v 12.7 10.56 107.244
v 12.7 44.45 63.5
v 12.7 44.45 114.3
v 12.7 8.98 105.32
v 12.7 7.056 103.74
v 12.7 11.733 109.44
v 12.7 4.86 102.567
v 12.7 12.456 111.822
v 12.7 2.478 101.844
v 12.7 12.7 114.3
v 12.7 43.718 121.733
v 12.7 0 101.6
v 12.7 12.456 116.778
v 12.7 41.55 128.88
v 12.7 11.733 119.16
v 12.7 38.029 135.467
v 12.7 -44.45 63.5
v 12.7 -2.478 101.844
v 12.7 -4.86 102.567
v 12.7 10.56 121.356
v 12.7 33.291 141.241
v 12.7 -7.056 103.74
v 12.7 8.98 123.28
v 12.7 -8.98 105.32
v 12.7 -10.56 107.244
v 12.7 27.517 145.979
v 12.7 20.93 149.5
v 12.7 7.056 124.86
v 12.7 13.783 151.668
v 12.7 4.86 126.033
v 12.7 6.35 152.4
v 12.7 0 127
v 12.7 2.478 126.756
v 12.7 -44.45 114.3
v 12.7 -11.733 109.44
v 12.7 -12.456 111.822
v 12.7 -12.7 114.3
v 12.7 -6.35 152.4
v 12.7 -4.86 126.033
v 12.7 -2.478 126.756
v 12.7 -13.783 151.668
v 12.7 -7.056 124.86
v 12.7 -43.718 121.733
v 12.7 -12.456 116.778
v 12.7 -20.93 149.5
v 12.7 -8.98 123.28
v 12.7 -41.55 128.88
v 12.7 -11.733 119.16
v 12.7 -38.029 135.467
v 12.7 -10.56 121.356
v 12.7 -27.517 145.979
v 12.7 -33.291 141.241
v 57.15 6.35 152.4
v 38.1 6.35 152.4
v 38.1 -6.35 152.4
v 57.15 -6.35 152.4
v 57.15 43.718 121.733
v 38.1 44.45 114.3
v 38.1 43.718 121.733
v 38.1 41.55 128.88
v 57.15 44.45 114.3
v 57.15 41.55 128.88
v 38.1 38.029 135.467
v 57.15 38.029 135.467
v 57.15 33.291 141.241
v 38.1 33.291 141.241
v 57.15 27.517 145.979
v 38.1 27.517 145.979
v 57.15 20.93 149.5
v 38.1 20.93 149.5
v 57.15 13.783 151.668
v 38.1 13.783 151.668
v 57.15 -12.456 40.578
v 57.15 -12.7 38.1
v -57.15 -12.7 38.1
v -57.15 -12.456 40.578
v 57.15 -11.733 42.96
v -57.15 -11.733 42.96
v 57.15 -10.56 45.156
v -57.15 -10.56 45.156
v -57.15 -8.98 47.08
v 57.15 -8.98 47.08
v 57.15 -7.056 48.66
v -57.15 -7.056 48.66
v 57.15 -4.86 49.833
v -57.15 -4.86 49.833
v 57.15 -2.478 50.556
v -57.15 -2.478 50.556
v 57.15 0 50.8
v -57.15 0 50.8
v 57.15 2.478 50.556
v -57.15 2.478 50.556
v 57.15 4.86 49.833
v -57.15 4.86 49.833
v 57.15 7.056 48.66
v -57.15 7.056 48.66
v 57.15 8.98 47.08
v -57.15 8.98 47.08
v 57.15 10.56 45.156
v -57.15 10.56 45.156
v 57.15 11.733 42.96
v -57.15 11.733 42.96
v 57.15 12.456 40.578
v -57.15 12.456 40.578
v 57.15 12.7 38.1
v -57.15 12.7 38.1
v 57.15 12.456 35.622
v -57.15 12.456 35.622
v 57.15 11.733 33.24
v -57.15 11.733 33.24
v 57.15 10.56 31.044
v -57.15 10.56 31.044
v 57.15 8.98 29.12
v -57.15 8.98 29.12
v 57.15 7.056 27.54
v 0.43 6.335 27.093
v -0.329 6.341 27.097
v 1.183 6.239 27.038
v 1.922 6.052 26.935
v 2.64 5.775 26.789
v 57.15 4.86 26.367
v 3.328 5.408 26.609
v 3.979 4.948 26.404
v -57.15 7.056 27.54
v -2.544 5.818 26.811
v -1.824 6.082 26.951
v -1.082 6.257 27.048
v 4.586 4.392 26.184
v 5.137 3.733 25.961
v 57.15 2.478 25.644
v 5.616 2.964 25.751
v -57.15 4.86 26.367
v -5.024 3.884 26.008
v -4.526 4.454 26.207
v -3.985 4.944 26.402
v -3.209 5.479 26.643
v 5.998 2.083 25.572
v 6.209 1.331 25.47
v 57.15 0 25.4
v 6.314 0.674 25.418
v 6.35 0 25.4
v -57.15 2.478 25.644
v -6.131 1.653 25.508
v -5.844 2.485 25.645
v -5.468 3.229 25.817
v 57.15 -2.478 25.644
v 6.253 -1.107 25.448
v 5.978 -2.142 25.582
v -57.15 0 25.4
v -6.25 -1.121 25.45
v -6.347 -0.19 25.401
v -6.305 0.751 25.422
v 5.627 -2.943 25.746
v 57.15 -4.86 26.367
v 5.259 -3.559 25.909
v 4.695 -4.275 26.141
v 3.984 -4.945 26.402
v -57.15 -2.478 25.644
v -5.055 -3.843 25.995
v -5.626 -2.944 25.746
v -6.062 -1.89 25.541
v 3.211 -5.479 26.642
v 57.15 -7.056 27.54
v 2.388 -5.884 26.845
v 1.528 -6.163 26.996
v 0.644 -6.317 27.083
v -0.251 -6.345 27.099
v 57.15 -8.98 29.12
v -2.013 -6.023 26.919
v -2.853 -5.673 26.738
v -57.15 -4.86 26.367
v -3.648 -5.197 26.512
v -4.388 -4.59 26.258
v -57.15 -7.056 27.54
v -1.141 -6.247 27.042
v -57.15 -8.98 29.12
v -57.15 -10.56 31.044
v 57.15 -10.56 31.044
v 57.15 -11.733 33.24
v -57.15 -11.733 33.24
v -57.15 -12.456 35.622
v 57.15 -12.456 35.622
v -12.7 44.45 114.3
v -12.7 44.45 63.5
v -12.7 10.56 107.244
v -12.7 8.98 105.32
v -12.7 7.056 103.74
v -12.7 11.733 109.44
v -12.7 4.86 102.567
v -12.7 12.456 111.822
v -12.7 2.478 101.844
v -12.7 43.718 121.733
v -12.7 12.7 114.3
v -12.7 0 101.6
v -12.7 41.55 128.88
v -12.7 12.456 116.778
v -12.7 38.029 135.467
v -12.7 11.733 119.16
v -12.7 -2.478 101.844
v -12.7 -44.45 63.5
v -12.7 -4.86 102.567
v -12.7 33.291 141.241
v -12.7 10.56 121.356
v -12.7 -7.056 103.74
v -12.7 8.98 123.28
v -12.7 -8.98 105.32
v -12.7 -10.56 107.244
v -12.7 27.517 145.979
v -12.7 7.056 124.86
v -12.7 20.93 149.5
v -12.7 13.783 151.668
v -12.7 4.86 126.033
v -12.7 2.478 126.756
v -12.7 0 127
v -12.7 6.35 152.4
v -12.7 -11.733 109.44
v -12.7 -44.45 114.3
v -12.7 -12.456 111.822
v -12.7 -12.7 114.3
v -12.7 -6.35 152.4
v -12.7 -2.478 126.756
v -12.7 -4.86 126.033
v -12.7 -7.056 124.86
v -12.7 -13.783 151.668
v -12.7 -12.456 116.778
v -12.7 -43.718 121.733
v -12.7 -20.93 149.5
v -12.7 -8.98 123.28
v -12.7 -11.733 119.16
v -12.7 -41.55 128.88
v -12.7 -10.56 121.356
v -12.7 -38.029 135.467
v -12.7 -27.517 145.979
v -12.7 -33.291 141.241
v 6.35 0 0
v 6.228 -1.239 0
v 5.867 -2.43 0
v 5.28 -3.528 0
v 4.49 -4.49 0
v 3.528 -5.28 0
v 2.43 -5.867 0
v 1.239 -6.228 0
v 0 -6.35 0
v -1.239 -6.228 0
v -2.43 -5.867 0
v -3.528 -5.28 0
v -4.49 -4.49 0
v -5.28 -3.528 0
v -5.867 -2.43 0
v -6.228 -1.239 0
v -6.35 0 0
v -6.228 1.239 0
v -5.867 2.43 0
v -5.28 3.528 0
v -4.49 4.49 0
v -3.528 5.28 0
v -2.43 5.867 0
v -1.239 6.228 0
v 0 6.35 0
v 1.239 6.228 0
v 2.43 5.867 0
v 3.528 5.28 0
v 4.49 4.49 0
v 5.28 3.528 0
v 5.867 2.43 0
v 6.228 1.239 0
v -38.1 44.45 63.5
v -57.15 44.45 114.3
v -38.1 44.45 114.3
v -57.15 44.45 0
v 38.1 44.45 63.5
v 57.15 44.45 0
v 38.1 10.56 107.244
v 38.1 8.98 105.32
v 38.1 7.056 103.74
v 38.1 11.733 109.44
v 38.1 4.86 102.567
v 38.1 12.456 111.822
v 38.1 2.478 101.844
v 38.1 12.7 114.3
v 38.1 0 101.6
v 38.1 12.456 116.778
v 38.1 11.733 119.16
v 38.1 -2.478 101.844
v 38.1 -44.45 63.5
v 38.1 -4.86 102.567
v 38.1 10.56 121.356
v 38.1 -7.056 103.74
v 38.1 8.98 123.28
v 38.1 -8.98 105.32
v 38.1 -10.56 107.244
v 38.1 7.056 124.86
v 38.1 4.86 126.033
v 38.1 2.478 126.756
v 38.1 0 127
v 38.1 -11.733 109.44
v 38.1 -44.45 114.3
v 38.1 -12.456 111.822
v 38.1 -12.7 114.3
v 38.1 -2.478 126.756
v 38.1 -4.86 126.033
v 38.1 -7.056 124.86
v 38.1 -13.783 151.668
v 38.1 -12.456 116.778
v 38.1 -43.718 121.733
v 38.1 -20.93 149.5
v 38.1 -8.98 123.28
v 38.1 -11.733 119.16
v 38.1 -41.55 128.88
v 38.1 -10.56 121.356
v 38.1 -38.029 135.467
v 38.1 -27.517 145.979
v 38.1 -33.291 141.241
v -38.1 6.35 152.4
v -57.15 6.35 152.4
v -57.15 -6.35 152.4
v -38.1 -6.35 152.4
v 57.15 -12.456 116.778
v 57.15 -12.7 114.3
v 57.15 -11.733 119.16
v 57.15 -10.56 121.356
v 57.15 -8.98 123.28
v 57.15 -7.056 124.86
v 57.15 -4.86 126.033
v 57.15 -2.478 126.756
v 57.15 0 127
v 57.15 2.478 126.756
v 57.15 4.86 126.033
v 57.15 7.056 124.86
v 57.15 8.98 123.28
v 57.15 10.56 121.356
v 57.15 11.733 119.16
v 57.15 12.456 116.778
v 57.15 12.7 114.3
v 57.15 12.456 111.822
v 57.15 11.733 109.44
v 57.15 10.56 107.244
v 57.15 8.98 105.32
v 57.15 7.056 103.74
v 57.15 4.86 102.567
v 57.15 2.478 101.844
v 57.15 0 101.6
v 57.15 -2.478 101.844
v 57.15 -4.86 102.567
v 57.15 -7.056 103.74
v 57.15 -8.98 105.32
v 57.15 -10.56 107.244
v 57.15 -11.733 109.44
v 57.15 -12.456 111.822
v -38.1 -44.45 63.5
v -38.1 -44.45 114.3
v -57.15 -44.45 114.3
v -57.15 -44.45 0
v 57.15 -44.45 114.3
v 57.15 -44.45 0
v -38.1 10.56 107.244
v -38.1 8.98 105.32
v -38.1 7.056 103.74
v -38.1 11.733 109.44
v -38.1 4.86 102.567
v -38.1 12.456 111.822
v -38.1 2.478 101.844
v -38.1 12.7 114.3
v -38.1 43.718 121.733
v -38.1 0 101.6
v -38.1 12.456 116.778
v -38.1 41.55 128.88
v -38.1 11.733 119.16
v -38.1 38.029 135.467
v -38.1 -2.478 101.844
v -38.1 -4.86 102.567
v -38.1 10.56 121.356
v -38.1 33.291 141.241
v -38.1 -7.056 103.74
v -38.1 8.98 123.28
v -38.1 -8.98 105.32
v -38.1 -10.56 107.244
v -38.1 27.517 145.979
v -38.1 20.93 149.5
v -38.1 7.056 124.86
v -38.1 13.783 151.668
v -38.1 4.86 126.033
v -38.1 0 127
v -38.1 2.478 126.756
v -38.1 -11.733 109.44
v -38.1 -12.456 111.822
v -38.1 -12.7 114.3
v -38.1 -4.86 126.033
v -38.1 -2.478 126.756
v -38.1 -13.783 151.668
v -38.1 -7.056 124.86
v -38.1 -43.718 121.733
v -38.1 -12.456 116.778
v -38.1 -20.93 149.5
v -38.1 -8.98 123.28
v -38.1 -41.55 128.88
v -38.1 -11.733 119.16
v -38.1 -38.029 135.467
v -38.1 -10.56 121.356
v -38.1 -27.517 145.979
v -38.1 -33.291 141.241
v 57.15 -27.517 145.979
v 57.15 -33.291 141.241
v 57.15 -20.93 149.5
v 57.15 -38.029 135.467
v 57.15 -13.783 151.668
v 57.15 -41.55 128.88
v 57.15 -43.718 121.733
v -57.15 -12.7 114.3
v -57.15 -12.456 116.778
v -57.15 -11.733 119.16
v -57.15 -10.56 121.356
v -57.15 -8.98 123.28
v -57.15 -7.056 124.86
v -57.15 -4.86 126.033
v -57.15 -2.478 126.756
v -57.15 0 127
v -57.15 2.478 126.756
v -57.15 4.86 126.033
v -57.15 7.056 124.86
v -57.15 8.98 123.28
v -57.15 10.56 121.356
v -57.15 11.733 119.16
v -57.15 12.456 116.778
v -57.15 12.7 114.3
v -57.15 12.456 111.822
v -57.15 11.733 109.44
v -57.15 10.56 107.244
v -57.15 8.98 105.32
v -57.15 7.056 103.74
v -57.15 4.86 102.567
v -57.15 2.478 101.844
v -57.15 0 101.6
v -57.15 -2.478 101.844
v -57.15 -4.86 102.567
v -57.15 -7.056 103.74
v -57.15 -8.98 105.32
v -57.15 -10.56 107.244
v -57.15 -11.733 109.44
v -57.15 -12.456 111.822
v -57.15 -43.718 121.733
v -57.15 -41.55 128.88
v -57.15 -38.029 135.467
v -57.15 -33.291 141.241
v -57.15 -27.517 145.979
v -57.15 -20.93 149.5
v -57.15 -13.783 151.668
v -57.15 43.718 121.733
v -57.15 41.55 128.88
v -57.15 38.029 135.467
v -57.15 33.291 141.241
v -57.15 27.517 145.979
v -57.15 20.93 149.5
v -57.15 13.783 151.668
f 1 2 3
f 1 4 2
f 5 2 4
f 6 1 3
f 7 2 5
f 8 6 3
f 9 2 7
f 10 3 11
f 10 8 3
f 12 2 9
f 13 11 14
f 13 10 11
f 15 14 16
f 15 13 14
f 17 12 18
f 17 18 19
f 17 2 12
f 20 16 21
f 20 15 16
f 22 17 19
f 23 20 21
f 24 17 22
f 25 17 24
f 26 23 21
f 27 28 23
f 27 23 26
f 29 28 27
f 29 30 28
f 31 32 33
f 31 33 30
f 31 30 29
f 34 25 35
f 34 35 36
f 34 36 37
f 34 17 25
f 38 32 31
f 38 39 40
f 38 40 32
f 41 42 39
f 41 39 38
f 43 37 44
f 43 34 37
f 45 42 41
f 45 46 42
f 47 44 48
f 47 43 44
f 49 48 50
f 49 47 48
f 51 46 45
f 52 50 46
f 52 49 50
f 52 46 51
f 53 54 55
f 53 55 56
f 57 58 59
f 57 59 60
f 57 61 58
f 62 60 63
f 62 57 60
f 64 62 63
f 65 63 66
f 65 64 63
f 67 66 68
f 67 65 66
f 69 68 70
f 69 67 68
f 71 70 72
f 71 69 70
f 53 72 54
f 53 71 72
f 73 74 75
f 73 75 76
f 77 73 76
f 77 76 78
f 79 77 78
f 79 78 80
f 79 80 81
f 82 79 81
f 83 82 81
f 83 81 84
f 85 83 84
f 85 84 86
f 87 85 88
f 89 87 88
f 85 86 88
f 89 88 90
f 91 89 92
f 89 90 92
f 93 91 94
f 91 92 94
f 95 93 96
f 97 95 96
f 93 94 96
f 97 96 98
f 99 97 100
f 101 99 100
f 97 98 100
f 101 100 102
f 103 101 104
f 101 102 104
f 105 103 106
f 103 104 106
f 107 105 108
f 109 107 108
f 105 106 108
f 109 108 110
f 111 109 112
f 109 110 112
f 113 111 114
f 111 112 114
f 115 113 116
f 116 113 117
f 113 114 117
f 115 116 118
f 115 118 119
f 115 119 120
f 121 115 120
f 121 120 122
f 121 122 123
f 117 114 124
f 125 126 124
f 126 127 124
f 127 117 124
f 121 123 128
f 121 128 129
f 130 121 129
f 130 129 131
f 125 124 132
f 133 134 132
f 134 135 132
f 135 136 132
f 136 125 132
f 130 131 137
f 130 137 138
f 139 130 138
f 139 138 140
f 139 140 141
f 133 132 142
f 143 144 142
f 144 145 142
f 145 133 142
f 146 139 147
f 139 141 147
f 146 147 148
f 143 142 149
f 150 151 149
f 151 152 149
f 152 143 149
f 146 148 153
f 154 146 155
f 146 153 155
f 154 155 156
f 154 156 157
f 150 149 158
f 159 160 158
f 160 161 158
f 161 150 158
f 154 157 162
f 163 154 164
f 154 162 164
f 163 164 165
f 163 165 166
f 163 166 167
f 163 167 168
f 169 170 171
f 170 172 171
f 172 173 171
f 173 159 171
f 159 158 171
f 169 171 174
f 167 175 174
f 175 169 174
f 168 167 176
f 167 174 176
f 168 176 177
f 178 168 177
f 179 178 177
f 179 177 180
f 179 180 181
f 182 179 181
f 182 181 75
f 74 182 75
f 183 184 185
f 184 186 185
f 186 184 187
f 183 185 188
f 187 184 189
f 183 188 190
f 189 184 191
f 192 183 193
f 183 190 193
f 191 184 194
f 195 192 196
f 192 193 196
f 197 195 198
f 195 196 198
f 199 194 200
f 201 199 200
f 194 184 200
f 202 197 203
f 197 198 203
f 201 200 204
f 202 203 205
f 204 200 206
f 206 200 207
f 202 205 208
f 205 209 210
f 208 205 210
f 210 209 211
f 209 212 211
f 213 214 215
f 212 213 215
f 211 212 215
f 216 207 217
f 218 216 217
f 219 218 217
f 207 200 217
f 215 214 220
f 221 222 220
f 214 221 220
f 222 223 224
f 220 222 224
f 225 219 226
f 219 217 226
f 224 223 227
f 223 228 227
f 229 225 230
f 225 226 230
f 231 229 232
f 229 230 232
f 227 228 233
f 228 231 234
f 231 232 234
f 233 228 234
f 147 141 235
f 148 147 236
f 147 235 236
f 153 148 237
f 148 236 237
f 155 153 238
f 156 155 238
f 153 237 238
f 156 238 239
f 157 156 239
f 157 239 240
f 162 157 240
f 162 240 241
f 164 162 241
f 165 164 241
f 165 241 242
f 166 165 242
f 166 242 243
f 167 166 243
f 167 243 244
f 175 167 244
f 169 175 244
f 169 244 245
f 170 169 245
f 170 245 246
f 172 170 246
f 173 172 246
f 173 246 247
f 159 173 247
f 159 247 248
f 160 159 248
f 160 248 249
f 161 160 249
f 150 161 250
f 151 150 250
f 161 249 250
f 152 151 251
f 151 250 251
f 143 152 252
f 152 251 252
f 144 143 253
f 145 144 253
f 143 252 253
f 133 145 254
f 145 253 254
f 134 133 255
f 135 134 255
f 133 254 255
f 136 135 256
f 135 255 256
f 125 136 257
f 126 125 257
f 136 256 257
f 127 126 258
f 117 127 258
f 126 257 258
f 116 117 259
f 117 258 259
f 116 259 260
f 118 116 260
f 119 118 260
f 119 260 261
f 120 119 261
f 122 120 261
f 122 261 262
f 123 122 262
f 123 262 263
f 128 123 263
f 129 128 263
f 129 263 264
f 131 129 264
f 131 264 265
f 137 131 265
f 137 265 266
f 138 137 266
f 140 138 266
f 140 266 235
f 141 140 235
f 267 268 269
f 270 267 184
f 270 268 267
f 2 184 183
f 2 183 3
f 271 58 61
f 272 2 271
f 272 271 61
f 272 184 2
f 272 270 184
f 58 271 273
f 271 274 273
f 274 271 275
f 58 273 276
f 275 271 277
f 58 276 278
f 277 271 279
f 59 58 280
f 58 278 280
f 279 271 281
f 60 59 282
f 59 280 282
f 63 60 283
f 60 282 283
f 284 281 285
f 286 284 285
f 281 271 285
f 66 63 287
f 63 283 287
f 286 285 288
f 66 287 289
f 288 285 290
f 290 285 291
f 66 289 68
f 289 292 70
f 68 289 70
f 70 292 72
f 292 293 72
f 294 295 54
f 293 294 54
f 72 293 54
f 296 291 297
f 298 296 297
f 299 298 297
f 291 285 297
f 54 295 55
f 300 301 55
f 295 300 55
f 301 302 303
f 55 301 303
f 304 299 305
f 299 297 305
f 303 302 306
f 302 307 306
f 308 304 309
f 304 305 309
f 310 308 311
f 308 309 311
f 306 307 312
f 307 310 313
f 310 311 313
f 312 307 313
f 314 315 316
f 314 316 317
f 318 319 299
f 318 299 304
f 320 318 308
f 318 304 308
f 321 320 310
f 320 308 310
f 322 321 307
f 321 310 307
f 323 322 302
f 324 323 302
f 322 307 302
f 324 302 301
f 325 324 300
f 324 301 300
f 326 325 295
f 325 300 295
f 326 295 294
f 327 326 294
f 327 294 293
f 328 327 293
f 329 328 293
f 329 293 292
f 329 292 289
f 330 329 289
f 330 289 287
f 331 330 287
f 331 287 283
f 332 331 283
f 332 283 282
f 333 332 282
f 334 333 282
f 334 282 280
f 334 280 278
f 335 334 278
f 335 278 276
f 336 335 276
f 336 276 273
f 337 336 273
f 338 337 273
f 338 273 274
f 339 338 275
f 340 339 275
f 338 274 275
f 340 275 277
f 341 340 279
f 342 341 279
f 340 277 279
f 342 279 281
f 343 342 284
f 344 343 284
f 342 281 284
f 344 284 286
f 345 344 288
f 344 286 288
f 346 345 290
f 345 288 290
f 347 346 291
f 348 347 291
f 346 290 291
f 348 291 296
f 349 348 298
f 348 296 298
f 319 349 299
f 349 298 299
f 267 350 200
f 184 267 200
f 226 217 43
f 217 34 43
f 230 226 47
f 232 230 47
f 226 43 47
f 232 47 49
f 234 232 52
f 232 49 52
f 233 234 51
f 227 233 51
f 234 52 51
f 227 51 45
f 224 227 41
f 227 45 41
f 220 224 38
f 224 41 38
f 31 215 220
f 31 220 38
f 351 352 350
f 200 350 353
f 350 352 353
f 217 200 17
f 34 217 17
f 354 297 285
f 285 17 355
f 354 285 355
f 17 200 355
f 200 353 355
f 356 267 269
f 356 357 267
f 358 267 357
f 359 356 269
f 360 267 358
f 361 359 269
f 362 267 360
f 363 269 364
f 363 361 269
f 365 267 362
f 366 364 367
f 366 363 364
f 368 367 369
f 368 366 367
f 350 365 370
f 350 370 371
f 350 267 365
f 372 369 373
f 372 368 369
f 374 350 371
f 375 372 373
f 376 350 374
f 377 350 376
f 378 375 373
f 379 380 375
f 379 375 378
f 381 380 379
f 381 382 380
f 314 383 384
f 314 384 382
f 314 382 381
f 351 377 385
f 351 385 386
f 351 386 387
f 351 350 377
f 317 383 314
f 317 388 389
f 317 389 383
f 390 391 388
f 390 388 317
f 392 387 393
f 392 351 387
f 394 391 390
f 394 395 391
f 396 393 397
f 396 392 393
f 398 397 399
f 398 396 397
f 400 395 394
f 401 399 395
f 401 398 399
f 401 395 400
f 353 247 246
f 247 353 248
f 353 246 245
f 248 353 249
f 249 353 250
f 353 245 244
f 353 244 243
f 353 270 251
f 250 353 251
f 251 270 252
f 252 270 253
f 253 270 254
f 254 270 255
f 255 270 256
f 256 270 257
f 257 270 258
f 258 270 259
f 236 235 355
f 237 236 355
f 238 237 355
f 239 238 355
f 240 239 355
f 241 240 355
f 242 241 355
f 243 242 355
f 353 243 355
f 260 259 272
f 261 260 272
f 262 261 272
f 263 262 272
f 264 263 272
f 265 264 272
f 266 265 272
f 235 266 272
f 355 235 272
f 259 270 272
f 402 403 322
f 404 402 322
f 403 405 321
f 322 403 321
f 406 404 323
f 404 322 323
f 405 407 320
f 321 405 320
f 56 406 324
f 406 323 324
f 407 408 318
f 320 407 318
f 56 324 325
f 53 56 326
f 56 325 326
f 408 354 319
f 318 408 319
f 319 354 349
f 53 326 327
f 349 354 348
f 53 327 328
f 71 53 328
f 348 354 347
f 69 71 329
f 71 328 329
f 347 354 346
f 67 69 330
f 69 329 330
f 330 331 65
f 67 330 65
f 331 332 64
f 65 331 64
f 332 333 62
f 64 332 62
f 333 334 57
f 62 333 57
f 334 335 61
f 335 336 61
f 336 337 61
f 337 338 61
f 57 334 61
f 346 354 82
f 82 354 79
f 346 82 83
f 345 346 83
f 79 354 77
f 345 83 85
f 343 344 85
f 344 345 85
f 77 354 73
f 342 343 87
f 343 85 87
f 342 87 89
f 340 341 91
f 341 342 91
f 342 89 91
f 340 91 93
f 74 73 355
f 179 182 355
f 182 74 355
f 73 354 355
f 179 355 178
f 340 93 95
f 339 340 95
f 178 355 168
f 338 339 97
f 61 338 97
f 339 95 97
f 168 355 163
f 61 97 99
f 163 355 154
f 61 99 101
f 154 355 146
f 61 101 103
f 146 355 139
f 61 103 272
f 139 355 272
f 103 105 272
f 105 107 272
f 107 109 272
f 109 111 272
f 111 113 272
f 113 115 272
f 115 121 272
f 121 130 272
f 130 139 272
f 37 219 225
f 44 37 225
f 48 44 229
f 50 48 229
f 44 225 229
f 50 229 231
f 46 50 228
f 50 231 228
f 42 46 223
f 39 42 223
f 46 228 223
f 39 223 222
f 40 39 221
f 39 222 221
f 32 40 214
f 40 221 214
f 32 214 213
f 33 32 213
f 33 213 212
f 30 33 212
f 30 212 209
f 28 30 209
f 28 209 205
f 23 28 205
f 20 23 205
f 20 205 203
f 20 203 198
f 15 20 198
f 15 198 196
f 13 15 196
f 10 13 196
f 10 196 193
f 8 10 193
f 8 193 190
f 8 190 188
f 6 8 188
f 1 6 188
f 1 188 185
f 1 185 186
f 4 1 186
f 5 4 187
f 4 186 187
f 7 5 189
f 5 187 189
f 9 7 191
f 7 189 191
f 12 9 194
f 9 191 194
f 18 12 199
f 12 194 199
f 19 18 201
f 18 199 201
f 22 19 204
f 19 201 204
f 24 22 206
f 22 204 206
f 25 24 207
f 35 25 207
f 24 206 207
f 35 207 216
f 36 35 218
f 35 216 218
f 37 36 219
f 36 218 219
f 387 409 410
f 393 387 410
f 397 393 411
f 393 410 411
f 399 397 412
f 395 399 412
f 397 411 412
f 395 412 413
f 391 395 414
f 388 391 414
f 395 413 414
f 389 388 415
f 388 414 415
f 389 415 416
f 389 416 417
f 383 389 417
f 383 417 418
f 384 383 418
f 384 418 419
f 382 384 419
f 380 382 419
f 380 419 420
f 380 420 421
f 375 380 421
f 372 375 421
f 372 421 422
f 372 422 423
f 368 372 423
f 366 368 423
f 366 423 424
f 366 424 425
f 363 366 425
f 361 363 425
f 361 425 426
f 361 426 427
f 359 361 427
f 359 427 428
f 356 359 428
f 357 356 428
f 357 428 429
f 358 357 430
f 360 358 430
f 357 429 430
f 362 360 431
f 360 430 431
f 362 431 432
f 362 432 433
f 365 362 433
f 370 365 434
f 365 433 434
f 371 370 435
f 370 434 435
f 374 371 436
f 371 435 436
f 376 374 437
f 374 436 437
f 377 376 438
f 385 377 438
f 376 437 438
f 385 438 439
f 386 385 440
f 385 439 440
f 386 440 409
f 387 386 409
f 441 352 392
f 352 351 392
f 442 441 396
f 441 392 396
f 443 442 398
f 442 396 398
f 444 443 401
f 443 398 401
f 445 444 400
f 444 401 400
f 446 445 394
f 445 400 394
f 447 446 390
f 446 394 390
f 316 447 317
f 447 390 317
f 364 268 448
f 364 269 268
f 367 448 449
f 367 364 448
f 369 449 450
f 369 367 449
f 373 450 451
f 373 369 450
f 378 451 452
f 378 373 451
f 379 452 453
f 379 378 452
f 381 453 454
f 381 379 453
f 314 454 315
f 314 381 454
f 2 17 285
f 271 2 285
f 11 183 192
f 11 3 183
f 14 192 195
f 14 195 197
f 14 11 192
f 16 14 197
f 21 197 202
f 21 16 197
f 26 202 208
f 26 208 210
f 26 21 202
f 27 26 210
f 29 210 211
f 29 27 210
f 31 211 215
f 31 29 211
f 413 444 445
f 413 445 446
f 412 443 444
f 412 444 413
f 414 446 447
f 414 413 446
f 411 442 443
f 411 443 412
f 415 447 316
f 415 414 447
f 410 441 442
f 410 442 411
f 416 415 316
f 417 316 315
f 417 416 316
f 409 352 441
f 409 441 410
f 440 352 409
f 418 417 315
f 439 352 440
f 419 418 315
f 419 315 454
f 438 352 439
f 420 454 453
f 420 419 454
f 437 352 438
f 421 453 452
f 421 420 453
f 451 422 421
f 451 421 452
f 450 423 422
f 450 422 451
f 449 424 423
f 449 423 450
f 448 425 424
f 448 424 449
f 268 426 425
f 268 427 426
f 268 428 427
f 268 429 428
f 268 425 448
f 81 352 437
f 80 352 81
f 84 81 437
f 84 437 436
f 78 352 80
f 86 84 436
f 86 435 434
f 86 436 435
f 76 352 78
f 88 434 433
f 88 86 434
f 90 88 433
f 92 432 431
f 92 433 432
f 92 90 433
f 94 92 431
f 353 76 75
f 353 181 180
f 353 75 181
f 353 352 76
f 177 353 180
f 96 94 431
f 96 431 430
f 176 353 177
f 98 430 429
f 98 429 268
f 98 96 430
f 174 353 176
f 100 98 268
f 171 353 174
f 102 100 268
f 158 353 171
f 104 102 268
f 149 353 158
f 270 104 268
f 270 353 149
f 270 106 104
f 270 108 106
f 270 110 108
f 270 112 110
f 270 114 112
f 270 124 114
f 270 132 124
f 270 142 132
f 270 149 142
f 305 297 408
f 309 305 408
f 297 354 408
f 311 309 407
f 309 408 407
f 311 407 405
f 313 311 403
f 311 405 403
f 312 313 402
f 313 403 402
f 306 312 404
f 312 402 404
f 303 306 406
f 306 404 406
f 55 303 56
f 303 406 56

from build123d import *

# Parameters (mm, degrees)
F0_W     = 114.3
F0_H     = 88.9
F1_DEPTH = 152.4
F2_W     = 25.4
F2_H     = 88.9
F3_DEPTH = 88.901
F4_R     = 38.1
F5_R     = 12.7
F6_DEPTH = 114.301
F7_R     = 6.35
F8_DEPTH = 38.1


with BuildPart() as f1:
    # F0 (on Top) → F1 (new body)
    with BuildSketch(Plane.XY):
        Rectangle(F0_W, F0_H)
    extrude(amount=F1_DEPTH)

    # F2 (on face) → F3 (cut, through all)
    with BuildSketch(Plane.XZ.offset(44.45)):
        with Locations((-25.4, 107.95)):
            Rectangle(F2_W, F2_H)
        with Locations((25.4, 107.95)):
            Rectangle(F2_W, F2_H)
    extrude(amount=-F3_DEPTH, mode=Mode.SUBTRACT)

    # F4
    f4_edges = [f1.edges().sort_by_distance(p)[0] for p in [
        (47.625, -44.45, 152.4),
        (0, -44.45, 152.4),
        (-47.625, -44.45, 152.4),
        (-47.625, 44.45, 152.4),
        (0, 44.45, 152.4),
        (47.625, 44.45, 152.4),
    ]]
    fillet(f4_edges, radius=F4_R)

    # F5 (on face) → F6 (cut, through all)
    with BuildSketch(Plane(origin=(-57.15, 0, 0), x_dir=(0, -1, 0), z_dir=(-1, 0, 0))):
        with Locations((0, 38.1)):
            Circle(F5_R)
        with Locations((0, 114.3)):
            Circle(F5_R)
    extrude(amount=-F6_DEPTH, mode=Mode.SUBTRACT)

    # F7 (on face) → F8 (cut)
    with BuildSketch(Plane(origin=(0, 0, 0), x_dir=(1, 0, 0), z_dir=(0, 0, -1))):
        Circle(F7_R)
    extrude(amount=-F8_DEPTH, mode=Mode.SUBTRACT)


solid = f1.part
